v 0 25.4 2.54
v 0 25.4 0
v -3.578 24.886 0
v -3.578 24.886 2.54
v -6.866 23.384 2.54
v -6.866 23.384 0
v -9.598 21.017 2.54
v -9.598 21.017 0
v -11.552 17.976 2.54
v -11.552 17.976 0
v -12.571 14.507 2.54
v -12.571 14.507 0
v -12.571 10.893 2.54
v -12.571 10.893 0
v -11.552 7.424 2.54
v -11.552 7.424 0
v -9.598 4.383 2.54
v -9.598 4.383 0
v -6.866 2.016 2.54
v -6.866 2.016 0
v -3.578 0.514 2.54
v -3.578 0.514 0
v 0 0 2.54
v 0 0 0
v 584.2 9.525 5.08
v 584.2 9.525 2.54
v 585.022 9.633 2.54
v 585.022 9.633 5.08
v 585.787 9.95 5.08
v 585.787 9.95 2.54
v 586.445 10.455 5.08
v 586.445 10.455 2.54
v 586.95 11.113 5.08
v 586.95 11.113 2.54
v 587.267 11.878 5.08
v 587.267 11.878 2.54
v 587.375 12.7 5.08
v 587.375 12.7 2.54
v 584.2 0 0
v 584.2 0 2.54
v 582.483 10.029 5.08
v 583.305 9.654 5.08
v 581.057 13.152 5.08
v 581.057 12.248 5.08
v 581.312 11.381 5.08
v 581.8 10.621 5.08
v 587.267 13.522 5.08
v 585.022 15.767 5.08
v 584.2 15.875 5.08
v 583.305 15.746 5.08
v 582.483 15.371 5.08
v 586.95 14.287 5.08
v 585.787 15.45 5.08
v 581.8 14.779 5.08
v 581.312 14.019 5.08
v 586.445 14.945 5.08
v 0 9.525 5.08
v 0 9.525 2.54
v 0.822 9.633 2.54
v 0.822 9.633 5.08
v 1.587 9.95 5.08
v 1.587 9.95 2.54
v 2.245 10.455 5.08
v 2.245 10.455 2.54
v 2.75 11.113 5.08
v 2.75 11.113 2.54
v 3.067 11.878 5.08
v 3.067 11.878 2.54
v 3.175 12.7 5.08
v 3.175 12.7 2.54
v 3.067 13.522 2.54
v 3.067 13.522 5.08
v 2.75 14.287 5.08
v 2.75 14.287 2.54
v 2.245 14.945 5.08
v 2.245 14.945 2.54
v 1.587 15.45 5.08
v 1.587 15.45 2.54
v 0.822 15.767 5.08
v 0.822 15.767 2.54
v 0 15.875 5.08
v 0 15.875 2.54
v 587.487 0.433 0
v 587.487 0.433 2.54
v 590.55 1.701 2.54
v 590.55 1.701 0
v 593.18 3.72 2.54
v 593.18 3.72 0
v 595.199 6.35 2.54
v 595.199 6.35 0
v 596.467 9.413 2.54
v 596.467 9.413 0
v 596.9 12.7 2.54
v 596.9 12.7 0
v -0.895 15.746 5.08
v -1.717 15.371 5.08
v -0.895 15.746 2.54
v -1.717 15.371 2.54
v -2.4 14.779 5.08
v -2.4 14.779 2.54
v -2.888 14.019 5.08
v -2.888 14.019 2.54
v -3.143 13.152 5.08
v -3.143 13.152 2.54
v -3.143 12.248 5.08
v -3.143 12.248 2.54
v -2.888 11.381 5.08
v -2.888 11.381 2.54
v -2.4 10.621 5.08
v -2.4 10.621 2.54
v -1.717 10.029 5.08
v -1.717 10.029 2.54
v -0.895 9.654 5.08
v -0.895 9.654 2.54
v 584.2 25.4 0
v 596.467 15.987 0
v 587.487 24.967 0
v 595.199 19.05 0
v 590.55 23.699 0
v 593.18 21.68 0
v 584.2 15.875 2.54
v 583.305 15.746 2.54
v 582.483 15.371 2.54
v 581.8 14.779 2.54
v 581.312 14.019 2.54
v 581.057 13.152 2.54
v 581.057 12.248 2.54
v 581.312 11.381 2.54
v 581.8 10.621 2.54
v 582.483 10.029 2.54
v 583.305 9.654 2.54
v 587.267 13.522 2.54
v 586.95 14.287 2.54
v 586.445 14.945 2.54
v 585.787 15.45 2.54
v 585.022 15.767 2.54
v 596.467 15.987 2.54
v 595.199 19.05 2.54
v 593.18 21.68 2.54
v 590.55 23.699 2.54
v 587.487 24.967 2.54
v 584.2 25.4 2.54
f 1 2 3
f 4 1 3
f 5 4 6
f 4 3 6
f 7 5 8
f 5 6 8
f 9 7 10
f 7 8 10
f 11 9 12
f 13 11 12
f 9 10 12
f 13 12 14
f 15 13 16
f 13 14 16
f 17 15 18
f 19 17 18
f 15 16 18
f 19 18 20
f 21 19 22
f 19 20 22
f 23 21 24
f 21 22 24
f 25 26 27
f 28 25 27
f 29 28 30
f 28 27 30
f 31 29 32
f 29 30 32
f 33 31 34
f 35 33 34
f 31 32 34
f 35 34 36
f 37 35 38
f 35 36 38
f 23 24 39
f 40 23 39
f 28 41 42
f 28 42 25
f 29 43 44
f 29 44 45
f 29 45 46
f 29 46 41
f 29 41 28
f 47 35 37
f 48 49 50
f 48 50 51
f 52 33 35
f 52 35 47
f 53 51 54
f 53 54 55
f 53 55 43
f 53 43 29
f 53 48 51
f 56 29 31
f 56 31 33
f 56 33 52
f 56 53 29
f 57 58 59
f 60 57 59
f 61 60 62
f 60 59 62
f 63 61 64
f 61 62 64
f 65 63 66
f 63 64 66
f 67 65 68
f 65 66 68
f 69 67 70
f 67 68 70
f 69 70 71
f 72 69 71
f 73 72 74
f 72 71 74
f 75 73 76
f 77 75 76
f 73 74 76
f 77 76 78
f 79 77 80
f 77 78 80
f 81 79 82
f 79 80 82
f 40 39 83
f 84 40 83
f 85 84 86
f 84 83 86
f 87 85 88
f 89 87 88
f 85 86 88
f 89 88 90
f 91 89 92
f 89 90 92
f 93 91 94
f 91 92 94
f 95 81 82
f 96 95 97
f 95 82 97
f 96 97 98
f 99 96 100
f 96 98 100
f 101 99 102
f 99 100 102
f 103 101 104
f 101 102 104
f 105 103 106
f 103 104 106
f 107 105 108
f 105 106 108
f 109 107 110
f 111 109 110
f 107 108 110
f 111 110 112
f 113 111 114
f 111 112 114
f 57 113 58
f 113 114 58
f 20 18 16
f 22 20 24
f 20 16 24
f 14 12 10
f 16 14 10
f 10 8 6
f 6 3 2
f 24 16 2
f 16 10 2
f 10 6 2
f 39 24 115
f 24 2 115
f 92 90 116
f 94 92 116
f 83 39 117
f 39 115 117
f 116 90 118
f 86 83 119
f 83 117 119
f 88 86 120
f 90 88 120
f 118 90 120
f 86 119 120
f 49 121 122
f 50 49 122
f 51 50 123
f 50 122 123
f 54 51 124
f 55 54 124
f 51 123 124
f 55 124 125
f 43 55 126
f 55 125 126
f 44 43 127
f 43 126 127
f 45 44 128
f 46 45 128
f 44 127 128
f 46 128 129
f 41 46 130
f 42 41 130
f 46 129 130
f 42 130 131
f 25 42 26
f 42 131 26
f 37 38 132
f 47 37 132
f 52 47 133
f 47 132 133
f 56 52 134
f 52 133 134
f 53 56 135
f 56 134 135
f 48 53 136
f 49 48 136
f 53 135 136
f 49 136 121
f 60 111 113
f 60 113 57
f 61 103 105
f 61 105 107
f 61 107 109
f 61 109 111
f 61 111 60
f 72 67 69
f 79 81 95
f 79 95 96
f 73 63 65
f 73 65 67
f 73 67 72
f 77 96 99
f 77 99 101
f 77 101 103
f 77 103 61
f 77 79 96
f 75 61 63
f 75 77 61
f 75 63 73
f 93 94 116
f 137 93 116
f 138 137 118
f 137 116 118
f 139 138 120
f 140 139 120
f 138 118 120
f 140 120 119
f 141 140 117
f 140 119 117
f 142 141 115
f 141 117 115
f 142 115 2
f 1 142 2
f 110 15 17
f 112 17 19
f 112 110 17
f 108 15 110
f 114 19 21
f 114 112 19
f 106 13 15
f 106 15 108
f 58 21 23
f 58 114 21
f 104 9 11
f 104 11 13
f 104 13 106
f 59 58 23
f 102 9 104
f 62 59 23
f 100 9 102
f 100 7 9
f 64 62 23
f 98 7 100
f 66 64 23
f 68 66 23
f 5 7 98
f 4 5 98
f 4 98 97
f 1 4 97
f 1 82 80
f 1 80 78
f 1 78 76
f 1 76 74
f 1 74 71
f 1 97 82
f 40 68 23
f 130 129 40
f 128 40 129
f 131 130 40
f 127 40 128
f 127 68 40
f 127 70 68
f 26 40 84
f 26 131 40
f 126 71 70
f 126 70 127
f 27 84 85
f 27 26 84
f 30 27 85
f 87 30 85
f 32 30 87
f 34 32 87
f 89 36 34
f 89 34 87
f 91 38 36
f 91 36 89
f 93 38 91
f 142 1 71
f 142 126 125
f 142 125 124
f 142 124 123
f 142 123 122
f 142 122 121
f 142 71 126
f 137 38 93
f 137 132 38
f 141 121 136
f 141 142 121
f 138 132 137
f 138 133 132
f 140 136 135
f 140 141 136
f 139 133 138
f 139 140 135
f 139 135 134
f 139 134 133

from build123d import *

# Parameters (mm, degrees)
SKETCH2_R           = 3.175
BOSS_EXTRUDE1_DEPTH = 2.54
SKETCH2_3_R         = 3.175
BOSS_EXTRUDE2_DEPTH = 5.08


with BuildPart() as part:
    # Sketch2 → Boss-Extrude1 (new body)
    with BuildSketch(Plane.XY):
        with BuildLine():
            Line((584.2, 25.4), (0, 25.4))
            ThreePointArc((0, 25.4), (-12.7, 12.7), (0, 0))
            Line((0, 0), (584.2, 0))
            ThreePointArc((584.2, 0), (596.9, 12.7), (584.2, 25.4))
        make_face()
        with Locations((0, 12.7)):
            Circle(SKETCH2_R, mode=Mode.SUBTRACT)
        with Locations((584.2, 12.7)):
            Circle(SKETCH2_R, mode=Mode.SUBTRACT)
    extrude(amount=BOSS_EXTRUDE1_DEPTH)

    # Sketch2<3> → Boss-Extrude2 (add)
    with BuildSketch(Plane.XY):
        with Locations((0, 12.7)):
            Circle(SKETCH2_3_R)
        with Locations((584.2, 12.7)):
            Circle(SKETCH2_3_R)
    extrude(amount=BOSS_EXTRUDE2_DEPTH)


solid = part.part
